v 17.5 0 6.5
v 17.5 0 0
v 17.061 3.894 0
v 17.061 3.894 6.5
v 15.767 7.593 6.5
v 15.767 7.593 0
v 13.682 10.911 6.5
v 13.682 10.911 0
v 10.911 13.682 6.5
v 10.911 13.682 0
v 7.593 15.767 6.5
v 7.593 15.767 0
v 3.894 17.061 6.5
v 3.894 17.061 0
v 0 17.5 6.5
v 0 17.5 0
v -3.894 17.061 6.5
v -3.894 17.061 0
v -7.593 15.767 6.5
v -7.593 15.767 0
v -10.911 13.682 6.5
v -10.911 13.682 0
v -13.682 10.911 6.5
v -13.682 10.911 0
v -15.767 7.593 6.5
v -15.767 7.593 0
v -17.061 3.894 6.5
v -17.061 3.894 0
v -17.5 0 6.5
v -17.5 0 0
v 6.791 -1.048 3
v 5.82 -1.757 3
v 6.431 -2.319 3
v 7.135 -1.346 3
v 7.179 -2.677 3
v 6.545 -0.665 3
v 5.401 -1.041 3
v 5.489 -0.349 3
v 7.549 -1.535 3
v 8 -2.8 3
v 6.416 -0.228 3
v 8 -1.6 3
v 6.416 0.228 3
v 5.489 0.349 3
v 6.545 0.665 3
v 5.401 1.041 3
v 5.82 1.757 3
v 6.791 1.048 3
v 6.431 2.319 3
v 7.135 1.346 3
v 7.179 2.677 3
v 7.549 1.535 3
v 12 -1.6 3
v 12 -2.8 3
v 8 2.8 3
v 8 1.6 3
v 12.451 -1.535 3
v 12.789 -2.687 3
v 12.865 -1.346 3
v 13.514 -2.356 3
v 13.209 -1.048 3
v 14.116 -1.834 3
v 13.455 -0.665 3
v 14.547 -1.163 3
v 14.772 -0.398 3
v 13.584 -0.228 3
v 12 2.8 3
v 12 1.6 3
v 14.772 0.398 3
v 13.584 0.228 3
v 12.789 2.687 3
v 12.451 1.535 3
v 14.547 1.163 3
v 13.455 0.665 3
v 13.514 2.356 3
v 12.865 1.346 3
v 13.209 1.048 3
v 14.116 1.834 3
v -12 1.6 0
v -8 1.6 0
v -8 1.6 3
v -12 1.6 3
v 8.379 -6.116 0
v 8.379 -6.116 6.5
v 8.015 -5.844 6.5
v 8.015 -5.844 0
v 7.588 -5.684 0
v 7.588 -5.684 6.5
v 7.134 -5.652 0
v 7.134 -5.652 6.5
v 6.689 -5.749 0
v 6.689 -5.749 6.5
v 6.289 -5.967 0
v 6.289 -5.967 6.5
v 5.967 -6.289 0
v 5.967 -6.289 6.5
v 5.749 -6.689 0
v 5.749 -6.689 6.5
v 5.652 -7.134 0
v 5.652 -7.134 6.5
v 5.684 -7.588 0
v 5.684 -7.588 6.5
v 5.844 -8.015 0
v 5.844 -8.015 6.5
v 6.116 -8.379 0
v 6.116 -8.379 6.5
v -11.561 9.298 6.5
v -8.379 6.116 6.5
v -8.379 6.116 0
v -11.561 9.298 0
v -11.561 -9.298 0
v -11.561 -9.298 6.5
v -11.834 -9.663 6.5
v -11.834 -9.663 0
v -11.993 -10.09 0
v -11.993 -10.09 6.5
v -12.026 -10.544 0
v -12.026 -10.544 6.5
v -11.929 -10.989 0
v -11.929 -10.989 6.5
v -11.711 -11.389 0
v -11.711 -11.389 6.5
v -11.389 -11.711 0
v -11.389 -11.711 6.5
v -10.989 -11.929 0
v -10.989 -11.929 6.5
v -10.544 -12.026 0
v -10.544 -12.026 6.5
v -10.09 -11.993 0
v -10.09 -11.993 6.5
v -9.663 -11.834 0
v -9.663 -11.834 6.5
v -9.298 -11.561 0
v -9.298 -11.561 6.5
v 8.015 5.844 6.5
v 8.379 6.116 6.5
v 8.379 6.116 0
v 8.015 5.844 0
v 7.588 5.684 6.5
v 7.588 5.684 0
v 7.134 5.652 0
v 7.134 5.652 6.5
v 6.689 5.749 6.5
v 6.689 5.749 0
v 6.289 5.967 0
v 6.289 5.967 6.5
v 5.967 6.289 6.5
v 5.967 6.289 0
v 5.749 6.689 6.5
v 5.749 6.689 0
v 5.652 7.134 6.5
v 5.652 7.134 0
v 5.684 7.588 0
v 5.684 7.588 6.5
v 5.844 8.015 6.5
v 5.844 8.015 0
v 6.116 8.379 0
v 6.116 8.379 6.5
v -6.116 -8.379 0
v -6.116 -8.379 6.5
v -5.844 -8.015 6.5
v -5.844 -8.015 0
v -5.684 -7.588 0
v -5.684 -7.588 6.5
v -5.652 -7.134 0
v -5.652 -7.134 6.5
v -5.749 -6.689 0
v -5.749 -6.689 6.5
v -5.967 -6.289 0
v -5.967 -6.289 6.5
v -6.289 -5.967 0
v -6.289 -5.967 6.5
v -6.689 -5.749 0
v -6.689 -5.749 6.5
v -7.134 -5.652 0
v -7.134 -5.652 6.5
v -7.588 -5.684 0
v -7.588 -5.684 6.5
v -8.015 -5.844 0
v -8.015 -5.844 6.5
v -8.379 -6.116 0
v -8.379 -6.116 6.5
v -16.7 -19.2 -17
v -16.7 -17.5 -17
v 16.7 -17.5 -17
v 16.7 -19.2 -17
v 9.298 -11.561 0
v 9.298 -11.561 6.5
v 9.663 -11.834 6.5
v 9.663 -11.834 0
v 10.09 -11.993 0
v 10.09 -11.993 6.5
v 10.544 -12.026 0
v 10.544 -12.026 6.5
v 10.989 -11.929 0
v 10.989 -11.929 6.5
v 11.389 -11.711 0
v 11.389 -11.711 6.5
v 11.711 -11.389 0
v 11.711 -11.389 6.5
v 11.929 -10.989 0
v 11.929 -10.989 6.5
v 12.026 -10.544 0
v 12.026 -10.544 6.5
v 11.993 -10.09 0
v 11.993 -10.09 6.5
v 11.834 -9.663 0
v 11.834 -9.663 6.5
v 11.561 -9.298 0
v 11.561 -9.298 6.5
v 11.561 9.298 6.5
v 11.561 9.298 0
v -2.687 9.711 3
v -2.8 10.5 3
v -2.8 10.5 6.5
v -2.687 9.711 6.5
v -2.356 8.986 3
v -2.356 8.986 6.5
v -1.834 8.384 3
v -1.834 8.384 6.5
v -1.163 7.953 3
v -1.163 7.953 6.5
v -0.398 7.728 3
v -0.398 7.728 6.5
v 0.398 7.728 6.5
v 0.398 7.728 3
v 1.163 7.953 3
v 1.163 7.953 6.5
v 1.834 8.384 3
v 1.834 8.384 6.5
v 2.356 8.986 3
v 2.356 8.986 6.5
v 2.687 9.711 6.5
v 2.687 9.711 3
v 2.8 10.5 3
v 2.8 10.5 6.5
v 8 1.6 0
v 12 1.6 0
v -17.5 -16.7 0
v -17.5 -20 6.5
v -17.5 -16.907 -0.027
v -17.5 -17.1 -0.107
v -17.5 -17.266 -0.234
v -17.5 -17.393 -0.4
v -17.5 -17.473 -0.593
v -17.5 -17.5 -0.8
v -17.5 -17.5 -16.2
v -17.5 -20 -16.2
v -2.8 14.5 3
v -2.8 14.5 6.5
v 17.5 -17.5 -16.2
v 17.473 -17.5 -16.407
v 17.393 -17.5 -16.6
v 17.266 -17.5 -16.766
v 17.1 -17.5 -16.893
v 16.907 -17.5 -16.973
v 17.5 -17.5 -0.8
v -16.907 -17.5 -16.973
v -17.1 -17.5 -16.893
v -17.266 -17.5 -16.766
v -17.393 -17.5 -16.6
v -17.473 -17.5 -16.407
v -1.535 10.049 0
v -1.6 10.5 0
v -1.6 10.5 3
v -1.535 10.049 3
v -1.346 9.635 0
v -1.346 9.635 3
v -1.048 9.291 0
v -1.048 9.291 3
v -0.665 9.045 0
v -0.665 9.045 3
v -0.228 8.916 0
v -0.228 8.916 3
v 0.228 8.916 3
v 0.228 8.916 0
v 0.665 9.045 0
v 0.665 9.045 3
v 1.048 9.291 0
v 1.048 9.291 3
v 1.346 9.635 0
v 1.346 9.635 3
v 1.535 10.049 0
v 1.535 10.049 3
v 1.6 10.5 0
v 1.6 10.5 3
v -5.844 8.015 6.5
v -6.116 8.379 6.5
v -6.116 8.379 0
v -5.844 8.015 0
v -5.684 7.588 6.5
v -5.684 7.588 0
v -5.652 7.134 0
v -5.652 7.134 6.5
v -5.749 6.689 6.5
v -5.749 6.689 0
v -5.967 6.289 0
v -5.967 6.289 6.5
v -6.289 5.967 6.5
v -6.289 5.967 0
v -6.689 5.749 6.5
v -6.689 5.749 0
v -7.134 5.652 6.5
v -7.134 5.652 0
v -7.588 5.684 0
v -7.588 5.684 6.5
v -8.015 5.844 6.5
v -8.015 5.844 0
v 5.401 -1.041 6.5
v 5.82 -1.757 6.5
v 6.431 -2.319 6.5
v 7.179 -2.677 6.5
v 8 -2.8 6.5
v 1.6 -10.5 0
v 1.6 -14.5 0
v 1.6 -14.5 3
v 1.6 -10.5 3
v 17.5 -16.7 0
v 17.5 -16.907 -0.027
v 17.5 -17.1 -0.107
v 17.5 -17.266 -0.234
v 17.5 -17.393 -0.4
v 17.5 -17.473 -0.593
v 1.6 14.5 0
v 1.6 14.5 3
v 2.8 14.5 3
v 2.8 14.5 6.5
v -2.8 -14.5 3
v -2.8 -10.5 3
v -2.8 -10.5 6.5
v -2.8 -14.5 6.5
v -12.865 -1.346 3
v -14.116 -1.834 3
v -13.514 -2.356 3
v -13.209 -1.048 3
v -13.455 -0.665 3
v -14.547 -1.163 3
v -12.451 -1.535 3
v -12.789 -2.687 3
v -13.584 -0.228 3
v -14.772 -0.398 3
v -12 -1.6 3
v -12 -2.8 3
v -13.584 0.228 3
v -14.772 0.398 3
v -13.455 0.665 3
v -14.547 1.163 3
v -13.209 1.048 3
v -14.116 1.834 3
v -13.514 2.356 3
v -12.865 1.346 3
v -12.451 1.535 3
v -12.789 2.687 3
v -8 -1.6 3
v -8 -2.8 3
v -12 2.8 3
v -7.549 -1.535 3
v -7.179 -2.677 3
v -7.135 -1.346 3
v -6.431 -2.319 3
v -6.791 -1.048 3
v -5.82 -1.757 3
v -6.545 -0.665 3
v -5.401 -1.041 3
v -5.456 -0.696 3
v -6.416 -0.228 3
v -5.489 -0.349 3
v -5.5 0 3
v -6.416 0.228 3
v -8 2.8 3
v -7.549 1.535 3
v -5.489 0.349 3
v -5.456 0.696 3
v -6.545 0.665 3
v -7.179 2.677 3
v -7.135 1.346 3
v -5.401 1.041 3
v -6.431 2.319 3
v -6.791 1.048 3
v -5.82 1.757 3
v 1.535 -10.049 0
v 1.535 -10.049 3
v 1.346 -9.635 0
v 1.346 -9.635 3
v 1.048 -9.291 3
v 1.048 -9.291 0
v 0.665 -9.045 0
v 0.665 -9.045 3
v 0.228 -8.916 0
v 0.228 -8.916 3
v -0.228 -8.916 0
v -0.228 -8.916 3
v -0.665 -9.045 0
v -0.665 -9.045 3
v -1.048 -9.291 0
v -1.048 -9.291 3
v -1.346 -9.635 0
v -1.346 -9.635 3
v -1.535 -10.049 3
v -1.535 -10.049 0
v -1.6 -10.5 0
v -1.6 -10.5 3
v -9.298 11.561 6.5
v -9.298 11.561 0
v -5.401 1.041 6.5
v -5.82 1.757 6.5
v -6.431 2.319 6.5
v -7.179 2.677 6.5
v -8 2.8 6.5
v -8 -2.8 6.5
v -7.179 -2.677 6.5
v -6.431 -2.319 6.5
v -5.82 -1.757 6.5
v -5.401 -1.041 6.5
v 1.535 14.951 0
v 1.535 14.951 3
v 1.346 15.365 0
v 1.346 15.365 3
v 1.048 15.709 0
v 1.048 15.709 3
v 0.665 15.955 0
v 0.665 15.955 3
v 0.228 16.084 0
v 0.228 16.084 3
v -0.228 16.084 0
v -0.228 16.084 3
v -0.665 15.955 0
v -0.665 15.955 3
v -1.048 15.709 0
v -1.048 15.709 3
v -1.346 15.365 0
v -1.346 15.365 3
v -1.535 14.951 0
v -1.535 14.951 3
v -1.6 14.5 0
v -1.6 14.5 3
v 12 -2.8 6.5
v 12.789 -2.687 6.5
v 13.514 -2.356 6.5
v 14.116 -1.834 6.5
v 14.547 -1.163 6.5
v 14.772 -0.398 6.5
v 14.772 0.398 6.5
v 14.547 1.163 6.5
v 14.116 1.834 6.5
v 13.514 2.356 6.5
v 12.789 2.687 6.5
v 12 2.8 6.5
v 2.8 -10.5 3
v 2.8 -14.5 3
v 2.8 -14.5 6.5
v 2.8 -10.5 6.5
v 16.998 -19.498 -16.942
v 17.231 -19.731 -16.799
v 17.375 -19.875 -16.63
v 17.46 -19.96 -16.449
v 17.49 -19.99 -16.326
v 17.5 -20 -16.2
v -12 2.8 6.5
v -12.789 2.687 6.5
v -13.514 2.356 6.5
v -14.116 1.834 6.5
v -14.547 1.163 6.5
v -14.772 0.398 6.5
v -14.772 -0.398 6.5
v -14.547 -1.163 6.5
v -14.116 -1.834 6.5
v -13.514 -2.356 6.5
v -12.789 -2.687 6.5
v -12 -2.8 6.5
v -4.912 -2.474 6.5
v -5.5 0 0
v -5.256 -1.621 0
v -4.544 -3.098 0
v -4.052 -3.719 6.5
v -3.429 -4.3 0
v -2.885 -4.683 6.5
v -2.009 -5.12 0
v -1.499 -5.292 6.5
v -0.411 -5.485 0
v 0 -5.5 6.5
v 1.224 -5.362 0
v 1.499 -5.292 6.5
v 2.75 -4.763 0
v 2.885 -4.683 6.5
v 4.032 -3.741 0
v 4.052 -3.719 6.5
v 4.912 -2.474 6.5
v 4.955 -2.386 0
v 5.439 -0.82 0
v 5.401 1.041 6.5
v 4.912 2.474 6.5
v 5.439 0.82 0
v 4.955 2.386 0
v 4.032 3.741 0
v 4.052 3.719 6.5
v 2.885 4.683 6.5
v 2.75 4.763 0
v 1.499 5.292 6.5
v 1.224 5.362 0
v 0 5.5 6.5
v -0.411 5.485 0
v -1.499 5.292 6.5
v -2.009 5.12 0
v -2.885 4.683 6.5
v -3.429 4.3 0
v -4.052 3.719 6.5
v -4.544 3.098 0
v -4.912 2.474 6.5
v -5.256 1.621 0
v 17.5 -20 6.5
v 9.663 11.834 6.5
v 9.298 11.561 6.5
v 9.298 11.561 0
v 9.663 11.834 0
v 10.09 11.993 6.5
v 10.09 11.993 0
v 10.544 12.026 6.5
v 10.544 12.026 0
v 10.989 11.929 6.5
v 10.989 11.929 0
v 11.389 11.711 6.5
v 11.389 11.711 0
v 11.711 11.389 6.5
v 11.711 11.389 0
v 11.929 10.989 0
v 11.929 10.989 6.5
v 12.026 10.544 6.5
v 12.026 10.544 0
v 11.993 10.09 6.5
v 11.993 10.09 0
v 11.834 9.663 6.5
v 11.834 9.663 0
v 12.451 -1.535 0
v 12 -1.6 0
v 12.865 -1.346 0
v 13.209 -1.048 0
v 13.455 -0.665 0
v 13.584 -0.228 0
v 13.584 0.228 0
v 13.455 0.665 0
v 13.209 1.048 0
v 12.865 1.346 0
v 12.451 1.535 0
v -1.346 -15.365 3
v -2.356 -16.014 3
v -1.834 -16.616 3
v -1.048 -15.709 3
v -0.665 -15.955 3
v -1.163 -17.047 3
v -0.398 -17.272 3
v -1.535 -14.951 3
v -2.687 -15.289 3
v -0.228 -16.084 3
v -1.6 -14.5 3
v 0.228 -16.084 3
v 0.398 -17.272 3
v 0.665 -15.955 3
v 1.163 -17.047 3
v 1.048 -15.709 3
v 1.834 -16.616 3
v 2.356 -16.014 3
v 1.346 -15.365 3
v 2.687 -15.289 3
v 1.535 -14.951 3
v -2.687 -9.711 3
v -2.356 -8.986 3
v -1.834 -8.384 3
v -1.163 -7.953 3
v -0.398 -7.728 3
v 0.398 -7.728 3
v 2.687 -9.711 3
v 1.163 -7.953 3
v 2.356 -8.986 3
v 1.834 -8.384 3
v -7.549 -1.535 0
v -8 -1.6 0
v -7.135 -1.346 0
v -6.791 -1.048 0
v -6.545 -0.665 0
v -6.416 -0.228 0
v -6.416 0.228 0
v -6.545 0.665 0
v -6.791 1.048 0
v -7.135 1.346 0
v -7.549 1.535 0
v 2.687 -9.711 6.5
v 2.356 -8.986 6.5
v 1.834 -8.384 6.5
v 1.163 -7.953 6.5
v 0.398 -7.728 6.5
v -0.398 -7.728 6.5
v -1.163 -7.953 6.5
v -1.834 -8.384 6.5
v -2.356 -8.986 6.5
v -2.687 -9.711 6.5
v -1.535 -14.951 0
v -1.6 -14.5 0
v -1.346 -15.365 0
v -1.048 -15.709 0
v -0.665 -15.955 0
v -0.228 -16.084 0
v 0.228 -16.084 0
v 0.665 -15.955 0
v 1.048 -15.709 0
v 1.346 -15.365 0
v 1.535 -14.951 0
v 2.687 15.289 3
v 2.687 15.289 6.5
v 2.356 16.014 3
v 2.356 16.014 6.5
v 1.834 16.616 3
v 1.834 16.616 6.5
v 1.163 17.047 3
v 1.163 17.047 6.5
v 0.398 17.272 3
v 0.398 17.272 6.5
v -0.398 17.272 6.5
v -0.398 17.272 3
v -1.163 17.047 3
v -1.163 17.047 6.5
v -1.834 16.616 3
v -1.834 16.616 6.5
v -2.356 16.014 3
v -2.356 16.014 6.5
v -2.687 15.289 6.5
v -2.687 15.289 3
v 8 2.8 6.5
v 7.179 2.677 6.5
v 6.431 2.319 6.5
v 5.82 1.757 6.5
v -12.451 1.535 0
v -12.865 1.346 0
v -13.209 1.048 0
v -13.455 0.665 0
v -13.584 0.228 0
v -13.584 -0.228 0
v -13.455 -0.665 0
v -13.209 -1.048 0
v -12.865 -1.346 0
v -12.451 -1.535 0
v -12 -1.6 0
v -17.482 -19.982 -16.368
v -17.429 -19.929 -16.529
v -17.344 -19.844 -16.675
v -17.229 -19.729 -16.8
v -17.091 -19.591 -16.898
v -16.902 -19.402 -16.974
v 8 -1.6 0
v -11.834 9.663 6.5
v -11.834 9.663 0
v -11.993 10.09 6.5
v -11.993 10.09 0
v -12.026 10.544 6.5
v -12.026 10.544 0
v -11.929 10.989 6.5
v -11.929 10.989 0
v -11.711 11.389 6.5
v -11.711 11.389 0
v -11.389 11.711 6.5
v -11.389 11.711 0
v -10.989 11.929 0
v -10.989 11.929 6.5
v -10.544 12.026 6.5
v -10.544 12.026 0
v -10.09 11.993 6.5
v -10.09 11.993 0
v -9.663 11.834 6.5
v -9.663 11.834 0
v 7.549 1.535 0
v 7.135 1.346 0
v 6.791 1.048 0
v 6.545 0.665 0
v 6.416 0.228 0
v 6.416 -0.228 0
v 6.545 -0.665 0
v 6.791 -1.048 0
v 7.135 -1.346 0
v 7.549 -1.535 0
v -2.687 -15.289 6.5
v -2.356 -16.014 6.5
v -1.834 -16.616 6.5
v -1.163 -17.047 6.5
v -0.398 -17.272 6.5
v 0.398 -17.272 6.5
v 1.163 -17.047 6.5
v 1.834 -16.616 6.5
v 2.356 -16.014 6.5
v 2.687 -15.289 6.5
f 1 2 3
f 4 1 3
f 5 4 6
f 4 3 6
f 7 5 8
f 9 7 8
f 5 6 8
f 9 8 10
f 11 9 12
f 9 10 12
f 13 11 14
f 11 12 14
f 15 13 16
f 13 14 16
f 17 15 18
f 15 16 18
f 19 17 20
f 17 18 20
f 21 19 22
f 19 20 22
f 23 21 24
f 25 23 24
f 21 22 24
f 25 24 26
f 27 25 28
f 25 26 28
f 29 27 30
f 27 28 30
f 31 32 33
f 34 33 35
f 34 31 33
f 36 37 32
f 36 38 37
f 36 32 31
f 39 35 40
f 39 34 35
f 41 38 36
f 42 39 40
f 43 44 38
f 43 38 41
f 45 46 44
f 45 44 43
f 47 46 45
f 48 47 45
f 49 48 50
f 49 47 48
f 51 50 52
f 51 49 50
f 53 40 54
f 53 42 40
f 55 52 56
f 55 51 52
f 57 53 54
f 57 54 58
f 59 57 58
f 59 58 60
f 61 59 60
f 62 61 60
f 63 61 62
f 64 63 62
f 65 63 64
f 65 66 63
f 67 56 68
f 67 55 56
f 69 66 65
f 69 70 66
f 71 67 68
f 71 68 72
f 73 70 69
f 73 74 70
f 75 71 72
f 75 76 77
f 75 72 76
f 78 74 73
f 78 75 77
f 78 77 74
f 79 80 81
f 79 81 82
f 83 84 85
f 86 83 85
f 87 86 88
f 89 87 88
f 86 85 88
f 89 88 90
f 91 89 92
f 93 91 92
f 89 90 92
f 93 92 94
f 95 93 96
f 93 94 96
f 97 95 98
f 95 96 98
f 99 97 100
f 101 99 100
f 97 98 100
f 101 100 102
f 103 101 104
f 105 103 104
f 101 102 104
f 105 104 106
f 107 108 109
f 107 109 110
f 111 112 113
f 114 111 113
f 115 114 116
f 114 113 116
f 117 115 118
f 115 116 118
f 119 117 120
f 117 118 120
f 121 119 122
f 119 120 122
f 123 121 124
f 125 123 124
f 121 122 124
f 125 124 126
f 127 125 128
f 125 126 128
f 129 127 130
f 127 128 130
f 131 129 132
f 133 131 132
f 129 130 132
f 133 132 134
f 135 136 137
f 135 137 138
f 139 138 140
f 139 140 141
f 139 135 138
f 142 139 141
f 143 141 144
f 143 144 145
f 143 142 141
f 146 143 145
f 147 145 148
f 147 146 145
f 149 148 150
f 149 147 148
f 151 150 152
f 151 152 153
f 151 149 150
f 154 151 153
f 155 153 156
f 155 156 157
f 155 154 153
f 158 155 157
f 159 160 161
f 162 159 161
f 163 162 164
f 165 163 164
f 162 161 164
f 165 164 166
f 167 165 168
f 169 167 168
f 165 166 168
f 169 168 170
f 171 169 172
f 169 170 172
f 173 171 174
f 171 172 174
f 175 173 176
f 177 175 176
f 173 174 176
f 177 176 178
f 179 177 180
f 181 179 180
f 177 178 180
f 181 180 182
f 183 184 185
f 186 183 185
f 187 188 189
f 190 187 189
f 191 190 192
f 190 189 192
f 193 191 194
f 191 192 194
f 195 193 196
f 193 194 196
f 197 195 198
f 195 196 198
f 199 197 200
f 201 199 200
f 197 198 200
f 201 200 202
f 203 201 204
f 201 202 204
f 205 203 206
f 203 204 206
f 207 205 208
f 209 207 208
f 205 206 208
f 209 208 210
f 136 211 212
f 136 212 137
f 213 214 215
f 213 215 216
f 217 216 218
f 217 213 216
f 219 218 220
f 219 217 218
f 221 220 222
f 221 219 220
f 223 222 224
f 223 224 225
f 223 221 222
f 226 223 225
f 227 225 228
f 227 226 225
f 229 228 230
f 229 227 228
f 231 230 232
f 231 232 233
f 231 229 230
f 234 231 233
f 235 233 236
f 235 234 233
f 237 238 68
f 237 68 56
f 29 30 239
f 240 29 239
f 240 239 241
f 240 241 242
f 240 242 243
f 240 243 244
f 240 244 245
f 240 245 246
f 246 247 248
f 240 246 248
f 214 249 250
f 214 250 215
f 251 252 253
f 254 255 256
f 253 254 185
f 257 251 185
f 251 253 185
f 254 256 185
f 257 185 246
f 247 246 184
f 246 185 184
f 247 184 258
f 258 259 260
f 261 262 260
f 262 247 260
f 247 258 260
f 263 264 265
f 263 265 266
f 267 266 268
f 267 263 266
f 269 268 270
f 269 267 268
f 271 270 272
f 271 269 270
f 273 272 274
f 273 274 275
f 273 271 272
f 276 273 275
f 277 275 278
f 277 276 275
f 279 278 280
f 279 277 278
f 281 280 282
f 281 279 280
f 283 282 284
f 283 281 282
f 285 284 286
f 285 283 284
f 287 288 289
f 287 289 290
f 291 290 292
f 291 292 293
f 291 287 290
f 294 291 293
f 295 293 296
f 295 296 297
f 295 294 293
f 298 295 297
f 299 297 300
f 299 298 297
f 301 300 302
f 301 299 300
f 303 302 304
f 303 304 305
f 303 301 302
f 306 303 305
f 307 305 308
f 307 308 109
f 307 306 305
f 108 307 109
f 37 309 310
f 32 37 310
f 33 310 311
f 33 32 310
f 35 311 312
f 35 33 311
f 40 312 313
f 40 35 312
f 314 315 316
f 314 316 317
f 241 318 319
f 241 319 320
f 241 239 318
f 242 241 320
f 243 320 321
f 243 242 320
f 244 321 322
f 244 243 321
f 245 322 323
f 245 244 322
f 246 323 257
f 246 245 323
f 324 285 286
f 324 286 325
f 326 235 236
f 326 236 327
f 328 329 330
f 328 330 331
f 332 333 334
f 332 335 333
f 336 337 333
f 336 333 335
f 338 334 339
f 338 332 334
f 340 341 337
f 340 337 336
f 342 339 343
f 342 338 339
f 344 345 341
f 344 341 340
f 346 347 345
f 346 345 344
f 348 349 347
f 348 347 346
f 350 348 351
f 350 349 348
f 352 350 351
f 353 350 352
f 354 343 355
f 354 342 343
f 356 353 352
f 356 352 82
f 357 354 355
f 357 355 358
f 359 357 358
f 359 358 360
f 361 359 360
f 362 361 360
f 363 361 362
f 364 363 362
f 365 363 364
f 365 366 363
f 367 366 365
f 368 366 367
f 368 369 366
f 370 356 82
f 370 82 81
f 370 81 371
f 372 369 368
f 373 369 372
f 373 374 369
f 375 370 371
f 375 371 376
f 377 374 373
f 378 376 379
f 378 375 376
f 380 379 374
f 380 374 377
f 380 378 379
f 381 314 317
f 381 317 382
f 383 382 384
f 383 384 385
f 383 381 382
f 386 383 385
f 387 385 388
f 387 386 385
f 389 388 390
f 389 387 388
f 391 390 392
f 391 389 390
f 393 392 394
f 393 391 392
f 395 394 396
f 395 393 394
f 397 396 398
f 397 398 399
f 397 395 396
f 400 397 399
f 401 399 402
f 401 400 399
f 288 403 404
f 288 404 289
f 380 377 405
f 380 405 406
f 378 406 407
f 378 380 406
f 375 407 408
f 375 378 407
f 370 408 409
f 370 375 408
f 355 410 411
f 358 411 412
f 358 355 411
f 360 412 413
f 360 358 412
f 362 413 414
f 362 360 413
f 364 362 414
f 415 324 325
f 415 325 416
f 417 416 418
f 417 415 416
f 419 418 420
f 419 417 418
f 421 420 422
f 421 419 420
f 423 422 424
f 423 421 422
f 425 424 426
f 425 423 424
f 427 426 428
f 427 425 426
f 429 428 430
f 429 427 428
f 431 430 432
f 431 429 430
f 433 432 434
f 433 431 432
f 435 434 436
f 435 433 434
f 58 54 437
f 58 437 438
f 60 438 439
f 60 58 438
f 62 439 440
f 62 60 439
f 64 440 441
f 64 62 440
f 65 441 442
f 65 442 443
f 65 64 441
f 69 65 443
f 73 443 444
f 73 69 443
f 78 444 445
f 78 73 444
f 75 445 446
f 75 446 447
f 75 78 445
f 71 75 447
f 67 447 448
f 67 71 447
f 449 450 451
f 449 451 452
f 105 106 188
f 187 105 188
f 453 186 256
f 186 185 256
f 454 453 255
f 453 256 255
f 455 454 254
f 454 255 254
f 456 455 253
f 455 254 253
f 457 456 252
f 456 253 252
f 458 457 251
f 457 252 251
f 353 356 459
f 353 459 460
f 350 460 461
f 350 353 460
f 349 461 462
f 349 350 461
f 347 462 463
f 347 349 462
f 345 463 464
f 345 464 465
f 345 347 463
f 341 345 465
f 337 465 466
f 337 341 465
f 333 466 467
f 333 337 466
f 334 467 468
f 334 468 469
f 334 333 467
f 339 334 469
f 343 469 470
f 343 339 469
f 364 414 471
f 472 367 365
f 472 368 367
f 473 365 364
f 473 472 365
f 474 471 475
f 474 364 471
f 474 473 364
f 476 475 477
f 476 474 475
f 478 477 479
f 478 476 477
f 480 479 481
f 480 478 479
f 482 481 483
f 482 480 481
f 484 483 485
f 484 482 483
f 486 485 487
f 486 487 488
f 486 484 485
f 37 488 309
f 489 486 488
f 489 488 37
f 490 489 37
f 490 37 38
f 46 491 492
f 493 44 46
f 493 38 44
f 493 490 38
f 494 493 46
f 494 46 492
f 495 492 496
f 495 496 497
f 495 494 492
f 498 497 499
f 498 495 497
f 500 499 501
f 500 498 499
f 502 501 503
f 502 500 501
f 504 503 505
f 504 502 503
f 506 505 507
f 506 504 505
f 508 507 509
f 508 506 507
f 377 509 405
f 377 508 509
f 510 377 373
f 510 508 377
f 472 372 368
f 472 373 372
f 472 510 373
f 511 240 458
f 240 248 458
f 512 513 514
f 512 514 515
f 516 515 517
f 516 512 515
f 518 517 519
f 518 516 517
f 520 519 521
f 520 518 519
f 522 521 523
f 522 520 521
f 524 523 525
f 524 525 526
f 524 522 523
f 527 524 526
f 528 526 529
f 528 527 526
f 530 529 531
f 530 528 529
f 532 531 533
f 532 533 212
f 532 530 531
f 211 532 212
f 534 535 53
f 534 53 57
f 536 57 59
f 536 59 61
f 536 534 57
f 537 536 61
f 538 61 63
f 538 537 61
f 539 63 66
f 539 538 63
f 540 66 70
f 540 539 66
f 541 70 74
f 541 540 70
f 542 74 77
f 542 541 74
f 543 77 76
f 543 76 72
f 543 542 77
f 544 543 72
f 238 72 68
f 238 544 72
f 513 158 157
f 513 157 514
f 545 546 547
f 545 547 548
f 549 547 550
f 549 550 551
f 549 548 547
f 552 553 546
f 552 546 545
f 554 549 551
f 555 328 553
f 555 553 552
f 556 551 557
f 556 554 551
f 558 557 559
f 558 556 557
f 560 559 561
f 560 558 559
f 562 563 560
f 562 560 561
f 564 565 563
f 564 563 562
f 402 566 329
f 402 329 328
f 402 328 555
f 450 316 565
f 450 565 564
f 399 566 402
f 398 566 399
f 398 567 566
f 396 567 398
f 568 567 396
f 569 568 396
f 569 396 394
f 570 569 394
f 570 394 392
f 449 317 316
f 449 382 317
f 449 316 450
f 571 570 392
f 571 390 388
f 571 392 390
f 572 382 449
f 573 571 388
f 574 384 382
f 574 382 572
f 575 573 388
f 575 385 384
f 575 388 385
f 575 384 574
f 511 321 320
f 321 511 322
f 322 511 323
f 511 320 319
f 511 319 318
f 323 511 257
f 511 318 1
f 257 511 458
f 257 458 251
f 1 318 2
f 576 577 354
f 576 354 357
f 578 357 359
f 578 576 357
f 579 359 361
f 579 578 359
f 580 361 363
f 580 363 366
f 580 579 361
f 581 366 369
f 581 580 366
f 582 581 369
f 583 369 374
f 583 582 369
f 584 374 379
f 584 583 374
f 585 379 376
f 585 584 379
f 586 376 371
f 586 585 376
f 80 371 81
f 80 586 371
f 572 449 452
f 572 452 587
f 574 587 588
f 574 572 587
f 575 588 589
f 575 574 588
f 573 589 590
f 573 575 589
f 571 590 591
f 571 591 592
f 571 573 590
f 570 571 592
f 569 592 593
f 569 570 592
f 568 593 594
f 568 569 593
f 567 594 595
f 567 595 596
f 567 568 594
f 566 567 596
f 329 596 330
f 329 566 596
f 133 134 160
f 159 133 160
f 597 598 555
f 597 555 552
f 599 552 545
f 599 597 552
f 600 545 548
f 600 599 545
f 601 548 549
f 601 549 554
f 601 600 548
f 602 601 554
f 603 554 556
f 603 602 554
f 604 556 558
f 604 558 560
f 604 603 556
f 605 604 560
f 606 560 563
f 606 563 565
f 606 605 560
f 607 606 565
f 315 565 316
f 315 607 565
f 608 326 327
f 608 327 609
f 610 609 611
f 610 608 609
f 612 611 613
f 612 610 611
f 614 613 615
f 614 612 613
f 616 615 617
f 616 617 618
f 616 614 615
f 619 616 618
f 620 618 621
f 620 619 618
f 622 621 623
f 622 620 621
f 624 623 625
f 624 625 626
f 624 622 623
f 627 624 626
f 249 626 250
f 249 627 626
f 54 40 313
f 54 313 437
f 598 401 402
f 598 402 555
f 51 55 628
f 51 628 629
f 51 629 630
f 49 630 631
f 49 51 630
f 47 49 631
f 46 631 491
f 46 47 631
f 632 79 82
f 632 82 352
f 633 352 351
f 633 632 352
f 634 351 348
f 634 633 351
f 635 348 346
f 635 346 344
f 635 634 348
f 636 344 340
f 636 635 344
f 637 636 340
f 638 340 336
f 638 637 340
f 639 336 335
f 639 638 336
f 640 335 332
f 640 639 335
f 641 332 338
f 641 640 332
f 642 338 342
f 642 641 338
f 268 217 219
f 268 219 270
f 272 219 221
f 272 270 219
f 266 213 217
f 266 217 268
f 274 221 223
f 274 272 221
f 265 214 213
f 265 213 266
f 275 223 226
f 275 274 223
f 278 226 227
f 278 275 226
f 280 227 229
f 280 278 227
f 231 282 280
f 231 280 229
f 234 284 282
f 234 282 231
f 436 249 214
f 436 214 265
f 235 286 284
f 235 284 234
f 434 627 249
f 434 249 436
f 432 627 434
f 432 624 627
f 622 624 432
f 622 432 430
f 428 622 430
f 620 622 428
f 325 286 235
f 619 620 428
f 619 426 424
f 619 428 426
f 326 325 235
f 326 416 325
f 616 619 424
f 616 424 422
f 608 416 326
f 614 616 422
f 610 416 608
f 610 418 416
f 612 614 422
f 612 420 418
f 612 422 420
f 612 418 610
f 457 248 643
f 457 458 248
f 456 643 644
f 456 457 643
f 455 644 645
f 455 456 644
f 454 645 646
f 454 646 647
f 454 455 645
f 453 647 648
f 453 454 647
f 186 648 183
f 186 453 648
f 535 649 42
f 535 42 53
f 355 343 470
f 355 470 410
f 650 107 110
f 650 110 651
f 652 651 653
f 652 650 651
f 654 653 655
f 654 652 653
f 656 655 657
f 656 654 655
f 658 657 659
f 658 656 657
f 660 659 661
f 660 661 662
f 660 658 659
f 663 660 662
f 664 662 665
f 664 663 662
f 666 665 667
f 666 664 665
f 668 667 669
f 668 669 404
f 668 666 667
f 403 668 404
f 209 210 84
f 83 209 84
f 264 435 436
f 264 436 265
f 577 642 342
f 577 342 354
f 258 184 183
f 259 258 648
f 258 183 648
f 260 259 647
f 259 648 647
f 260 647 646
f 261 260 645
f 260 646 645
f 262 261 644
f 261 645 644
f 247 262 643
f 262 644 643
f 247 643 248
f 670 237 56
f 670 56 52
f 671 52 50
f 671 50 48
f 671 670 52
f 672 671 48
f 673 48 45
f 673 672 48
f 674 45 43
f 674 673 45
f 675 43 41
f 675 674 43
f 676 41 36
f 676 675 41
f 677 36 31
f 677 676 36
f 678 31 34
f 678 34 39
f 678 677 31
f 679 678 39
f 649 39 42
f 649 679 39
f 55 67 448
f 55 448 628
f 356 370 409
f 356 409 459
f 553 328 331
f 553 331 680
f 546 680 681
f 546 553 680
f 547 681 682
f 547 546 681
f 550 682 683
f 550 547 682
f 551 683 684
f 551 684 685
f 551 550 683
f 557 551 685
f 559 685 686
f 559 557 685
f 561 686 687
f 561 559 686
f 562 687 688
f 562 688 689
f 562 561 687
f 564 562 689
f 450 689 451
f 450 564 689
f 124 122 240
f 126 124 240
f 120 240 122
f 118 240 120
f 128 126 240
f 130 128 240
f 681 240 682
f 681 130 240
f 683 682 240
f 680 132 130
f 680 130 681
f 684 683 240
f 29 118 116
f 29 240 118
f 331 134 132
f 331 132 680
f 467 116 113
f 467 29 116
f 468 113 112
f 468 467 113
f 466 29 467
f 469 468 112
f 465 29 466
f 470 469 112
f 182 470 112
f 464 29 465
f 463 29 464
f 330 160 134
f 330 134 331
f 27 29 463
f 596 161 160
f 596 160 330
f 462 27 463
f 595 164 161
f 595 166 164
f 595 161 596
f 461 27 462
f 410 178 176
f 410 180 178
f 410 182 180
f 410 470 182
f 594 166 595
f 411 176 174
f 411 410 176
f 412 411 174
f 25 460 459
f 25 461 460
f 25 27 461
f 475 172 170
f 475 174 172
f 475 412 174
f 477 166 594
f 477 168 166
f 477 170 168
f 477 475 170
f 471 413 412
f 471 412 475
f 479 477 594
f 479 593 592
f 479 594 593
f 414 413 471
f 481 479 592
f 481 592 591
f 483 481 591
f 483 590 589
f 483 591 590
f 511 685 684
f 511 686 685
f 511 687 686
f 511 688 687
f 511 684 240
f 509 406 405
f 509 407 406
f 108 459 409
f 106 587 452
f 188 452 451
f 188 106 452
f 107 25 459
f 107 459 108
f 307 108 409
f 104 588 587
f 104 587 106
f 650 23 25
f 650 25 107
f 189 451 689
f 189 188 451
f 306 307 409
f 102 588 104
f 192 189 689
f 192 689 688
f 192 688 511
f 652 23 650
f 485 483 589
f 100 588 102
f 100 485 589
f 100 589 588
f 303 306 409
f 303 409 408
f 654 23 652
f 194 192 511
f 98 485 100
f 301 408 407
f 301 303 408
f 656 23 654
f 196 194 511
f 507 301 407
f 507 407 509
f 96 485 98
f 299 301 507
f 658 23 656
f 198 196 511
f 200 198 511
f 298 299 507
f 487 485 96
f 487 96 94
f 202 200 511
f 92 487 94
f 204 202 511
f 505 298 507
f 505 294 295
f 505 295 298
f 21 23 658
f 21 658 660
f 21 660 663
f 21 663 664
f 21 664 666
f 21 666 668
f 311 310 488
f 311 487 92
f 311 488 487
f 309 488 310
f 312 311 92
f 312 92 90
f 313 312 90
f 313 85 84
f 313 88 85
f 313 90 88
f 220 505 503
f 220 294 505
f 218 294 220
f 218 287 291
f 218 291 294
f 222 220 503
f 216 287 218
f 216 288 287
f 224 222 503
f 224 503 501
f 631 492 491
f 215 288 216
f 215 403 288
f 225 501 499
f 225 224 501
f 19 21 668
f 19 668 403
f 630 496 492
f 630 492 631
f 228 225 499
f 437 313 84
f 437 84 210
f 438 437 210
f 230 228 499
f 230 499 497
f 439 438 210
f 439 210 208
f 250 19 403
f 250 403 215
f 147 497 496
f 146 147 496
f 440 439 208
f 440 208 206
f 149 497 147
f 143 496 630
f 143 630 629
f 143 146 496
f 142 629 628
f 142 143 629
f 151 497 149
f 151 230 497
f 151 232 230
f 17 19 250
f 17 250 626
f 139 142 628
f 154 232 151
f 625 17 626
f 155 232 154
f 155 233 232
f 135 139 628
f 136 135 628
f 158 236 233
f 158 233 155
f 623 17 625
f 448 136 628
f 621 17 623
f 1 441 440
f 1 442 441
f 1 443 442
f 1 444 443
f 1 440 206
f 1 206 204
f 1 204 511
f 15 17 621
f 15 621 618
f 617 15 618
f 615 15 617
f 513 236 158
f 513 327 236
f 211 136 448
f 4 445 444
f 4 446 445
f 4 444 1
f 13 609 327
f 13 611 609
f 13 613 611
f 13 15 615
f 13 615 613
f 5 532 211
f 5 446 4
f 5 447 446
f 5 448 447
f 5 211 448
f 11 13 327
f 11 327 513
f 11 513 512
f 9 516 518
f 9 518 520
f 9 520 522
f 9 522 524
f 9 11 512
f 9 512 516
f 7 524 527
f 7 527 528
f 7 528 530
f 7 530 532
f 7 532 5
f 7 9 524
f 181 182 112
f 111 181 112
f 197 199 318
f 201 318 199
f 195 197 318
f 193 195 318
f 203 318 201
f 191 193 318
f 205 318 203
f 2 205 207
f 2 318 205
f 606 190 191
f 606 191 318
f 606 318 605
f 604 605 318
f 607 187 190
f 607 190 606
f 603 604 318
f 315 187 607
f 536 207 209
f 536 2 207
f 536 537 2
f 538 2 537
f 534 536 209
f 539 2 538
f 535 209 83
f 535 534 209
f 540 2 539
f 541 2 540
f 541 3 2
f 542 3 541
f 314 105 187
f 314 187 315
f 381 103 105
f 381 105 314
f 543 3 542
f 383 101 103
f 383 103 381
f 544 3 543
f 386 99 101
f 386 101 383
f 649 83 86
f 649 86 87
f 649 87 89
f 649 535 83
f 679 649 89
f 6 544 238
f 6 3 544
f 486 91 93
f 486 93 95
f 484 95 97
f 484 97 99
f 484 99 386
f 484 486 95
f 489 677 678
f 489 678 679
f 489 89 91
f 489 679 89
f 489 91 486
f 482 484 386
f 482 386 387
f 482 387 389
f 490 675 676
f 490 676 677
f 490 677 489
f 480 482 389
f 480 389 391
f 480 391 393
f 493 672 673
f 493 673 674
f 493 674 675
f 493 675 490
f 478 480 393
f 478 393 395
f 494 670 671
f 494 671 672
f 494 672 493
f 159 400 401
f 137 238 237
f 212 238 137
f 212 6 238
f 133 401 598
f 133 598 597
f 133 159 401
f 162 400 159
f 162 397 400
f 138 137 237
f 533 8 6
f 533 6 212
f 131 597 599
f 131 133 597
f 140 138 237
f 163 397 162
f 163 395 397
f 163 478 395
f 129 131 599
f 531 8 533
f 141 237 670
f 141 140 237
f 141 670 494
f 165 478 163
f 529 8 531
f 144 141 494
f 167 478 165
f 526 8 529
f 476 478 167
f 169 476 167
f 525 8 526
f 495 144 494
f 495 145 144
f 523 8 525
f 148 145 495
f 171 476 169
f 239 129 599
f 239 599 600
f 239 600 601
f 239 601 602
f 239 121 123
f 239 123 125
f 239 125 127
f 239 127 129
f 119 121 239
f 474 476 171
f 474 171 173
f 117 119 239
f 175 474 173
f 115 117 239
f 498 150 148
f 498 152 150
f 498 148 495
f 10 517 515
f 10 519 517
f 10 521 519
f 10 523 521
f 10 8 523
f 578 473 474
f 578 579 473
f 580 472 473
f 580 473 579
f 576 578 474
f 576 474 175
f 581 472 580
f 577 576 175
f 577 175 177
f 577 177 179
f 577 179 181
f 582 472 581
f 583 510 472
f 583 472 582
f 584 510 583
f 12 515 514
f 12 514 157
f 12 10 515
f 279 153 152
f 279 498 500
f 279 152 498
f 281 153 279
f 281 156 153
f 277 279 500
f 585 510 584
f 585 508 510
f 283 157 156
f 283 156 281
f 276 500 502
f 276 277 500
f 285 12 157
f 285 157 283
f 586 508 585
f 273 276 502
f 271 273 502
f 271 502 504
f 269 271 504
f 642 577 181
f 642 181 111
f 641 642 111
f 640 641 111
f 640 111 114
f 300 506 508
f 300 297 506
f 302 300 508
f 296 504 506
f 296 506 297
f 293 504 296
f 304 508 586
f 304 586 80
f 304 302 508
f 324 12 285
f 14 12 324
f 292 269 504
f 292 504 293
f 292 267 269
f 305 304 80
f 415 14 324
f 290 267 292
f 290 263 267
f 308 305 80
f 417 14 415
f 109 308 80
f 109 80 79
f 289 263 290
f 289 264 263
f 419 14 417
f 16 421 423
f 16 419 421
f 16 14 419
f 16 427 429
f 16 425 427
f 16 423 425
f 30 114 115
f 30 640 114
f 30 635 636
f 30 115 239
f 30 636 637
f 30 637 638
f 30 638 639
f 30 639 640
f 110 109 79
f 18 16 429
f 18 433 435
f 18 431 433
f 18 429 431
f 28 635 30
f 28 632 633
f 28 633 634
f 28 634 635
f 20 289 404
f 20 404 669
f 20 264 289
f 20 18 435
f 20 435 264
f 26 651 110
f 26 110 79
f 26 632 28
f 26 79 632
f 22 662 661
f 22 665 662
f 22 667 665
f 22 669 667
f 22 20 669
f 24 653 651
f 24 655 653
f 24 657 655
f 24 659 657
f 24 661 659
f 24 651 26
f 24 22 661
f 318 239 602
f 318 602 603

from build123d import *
from build123d.topology import SkipClean

# Parameters (mm, degrees)
SKETCH_1_R          = 17.5
EXTRUDE_1_DEPTH     = 3
EXTRUDE_START       = -20
EXTRUDE_2_DEPTH     = 20
SKETCH_3_W          = 42.038336367
SKETCH_3_H          = 17.5
CUT_EXTRUDE_2_DEPTH = 17
FILLET_1_R          = 0.8
SKETCH_4_R          = 5.5
CUT_EXTRUDE_3_DEPTH = 32.547583109
SKETCH_5_R          = 5.5
EXTRUDE_3_DEPTH     = 3.5
CUT_EXTRUDE_START   = -3.5
CUT_EXTRUDE_5_DEPTH = 3.5
CUT_EXTRUDE_6_DEPTH = 6.5


with BuildPart() as part:
    # 草图1 → 凸台-拉伸1 (new body)
    with BuildSketch(Plane.XY):
        Circle(SKETCH_1_R)
        with BuildLine():
            Line((1.6, 14.5), (1.6, 10.5))
            ThreePointArc((1.6, 10.5), (0, 8.9), (-1.6, 10.5))
            Line((-1.6, 10.5), (-1.6, 14.5))
            ThreePointArc((-1.6, 14.5), (0, 16.1), (1.6, 14.5))
        make_face(mode=Mode.SUBTRACT)
        with BuildLine():
            Line((1.6, -14.5), (1.6, -10.5))
            ThreePointArc((1.6, -10.5), (0, -8.9), (-1.6, -10.5))
            Line((-1.6, -10.5), (-1.6, -14.5))
            ThreePointArc((-1.6, -14.5), (0, -16.1), (1.6, -14.5))
        make_face(mode=Mode.SUBTRACT)
        with BuildLine():
            Line((-12, 1.6), (-8, 1.6))
            ThreePointArc((-8, 1.6), (-6.4, 0), (-8, -1.6))
            Line((-8, -1.6), (-12, -1.6))
            ThreePointArc((-12, -1.6), (-13.6, 0), (-12, 1.6))
        make_face(mode=Mode.SUBTRACT)
        with BuildLine():
            Line((12, 1.6), (8, 1.6))
            ThreePointArc((8, 1.6), (6.4, 0), (8, -1.6))
            Line((8, -1.6), (12, -1.6))
            ThreePointArc((12, -1.6), (13.6, 0), (12, 1.6))
        make_face(mode=Mode.SUBTRACT)
    extrude(amount=EXTRUDE_1_DEPTH)

    # 草图2 → 凸台-拉伸2 (add)
    with BuildSketch(Plane.XY.offset(3).offset(EXTRUDE_START)):
        with BuildLine():
            Line((-17.5, -20), (17.5, -20))
            Line((17.5, -20), (17.5, 0))
            ThreePointArc((17.5, 0), (0, -17.5), (-17.5, 0))
            Line((-17.5, 0), (-17.5, -20))
        make_face()
    extrude(amount=EXTRUDE_2_DEPTH)

    # 草图3 → 切除-拉伸2 (cut)
    with BuildSketch(Plane(origin=(0, 0, -17), x_dir=(-1, 0, 0), z_dir=(0, 0, -1))):
        with Locations((-0.801424091, -8.75)):
            Rectangle(SKETCH_3_W, SKETCH_3_H)
    extrude(amount=-CUT_EXTRUDE_2_DEPTH, mode=Mode.SUBTRACT)

    # 圆角1
    fillet_1_edges = [part.edges().sort_by_distance(p)[0] for p in [
        (17.5, -18.75, -17),
        (0, -20, -17),
        (-17.5, -18.75, -17),
        (0, -17.5, 0),
    ]]
    fillet(fillet_1_edges, radius=FILLET_1_R)

    # 草图4 → 切除-拉伸3 (cut, through all)
    with BuildSketch(Plane(origin=(0, 0, 0), x_dir=(-1, 0, 0), z_dir=(0, 0, -1))):
        Circle(SKETCH_4_R)
    extrude(amount=-CUT_EXTRUDE_3_DEPTH, mode=Mode.SUBTRACT)

    # 草图5 → 凸台-拉伸3 (add)
    with SkipClean():  # the faces are left unmerged after this step: merging them gives an invalid solid
        with BuildSketch(Plane.XY.offset(3)):
            with BuildLine():
                Line((-17.5, 0), (-17.5, -20))
                Line((-17.5, -20), (17.5, -20))
                Line((17.5, -20), (17.5, 0))
                ThreePointArc((17.5, 0), (0, 17.5), (-17.5, 0))
            make_face()
            with Locations(Location((0, 0, 0), (0, 0, 180))):
                Circle(SKETCH_5_R, mode=Mode.SUBTRACT)
            with BuildLine():
                Line((1.6, -14.5), (1.6, -10.5))
                ThreePointArc((1.6, -10.5), (0, -8.9), (-1.6, -10.5))
                Line((-1.6, -10.5), (-1.6, -14.5))
                ThreePointArc((-1.6, -14.5), (0, -16.1), (1.6, -14.5))
            make_face(mode=Mode.SUBTRACT)
            with BuildLine():
                Line((-8, 1.6), (-12, 1.6))
                ThreePointArc((-12, 1.6), (-13.6, 0), (-12, -1.6))
                Line((-12, -1.6), (-8, -1.6))
                ThreePointArc((-8, -1.6), (-6.4, 0), (-8, 1.6))
            make_face(mode=Mode.SUBTRACT)
            with BuildLine():
                Line((8, -1.6), (12, -1.6))
                ThreePointArc((12, -1.6), (13.6, 0), (12, 1.6))
                Line((12, 1.6), (8, 1.6))
                ThreePointArc((8, 1.6), (6.4, 0), (8, -1.6))
            make_face(mode=Mode.SUBTRACT)
            with BuildLine():
                Line((1.6, 10.5), (1.6, 14.5))
                ThreePointArc((1.6, 14.5), (0, 16.1), (-1.6, 14.5))
                Line((-1.6, 14.5), (-1.6, 10.5))
                ThreePointArc((-1.6, 10.5), (0, 8.9), (1.6, 10.5))
            make_face(mode=Mode.SUBTRACT)
        extrude(amount=EXTRUDE_3_DEPTH)
    add(part.part.scale(1), mode=Mode.REPLACE)  # the faces are merged on a copy

    # 草图7 → 切除-拉伸5 (cut)
    # profile 1 of 4: a face of its own
    with BuildSketch(Plane.XY.offset(6.5).offset(CUT_EXTRUDE_START)):
        with BuildLine():
            Line((2.8, -14.5), (2.8, -10.5))
            ThreePointArc((2.8, -10.5), (0, -7.7), (-2.8, -10.5))
            Line((-2.8, -10.5), (-2.8, -14.5))
            ThreePointArc((-2.8, -14.5), (0, -17.3), (2.8, -14.5))
        make_face()
        with BuildLine():
            Line((1.6, -14.5), (1.6, -10.5))
            ThreePointArc((1.6, -10.5), (0, -8.9), (-1.6, -10.5))
            Line((-1.6, -10.5), (-1.6, -14.5))
            ThreePointArc((-1.6, -14.5), (0, -16.1), (1.6, -14.5))
        make_face(mode=Mode.SUBTRACT)
    # profile 2 of 4: a face of its own
    with BuildSketch(Plane.XY.offset(6.5).offset(CUT_EXTRUDE_START)):
        with BuildLine():
            Line((8, -2.8), (12, -2.8))
            ThreePointArc((12, -2.8), (14.8, 0), (12, 2.8))
            Line((12, 2.8), (8, 2.8))
            ThreePointArc((8, 2.8), (5.2, 0), (8, -2.8))
        make_face()
        with BuildLine():
            Line((8, -1.6), (12, -1.6))
            ThreePointArc((12, -1.6), (13.6, 0), (12, 1.6))
            Line((12, 1.6), (8, 1.6))
            ThreePointArc((8, 1.6), (6.4, 0), (8, -1.6))
        make_face(mode=Mode.SUBTRACT)
    # profile 3 of 4: a face of its own
    with BuildSketch(Plane.XY.offset(6.5).offset(CUT_EXTRUDE_START)):
        with BuildLine():
            Line((-12, -2.8), (-8, -2.8))
            ThreePointArc((-8, -2.8), (-5.2, 0), (-8, 2.8))
            Line((-8, 2.8), (-12, 2.8))
            ThreePointArc((-12, 2.8), (-14.8, 0), (-12, -2.8))
        make_face()
        with BuildLine():
            Line((-12, -1.6), (-8, -1.6))
            ThreePointArc((-8, -1.6), (-6.4, 0), (-8, 1.6))
            Line((-8, 1.6), (-12, 1.6))
            ThreePointArc((-12, 1.6), (-13.6, 0), (-12, -1.6))
        make_face(mode=Mode.SUBTRACT)
    # profile 4 of 4: a face of its own
    with BuildSketch(Plane.XY.offset(6.5).offset(CUT_EXTRUDE_START)):
        with BuildLine():
            Line((2.8, 10.5), (2.8, 14.5))
            ThreePointArc((2.8, 14.5), (0, 17.3), (-2.8, 14.5))
            Line((-2.8, 14.5), (-2.8, 10.5))
            ThreePointArc((-2.8, 10.5), (0, 7.7), (2.8, 10.5))
        make_face()
        with BuildLine():
            Line((1.6, 10.5), (1.6, 14.5))
            ThreePointArc((1.6, 14.5), (0, 16.1), (-1.6, 14.5))
            Line((-1.6, 14.5), (-1.6, 10.5))
            ThreePointArc((-1.6, 10.5), (0, 8.9), (1.6, 10.5))
        make_face(mode=Mode.SUBTRACT)
    extrude(amount=CUT_EXTRUDE_5_DEPTH, mode=Mode.SUBTRACT)

    # 草图8 → 切除-拉伸6 (cut)
    with BuildSketch(Plane.XY.offset(6.5)):
        with BuildLine():
            Line((11.561195872, 9.298454173), (8.379215357, 6.116473657))
            ThreePointArc((8.379215357, 6.116473657), (6.116473657, 6.116473657), (6.116473657, 8.379215357))
            Line((6.116473657, 8.379215357), (9.298454173, 11.561195872))
            ThreePointArc((9.298454173, 11.561195872), (11.561195872, 11.561195872), (11.561195872, 9.298454173))
        make_face()
        with BuildLine():
            Line((-8.379215357, 6.116473657), (-11.561195872, 9.298454173))
            ThreePointArc((-11.561195872, 9.298454173), (-11.561195872, 11.561195872), (-9.298454173, 11.561195872))
            Line((-9.298454173, 11.561195872), (-6.116473657, 8.379215357))
            ThreePointArc((-6.116473657, 8.379215357), (-6.116473657, 6.116473657), (-8.379215357, 6.116473657))
        make_face()
        with BuildLine():
            Line((6.116473657, -8.379215357), (9.298454173, -11.561195872))
            ThreePointArc((9.298454173, -11.561195872), (11.561195872, -11.561195872), (11.561195872, -9.298454173))
            Line((11.561195872, -9.298454173), (8.379215357, -6.116473657))
            ThreePointArc((8.379215357, -6.116473657), (6.116473657, -6.116473657), (6.116473657, -8.379215357))
        make_face()
        with BuildLine():
            Line((-9.298454173, -11.561195872), (-6.116473657, -8.379215357))
            ThreePointArc((-6.116473657, -8.379215357), (-6.116473657, -6.116473657), (-8.379215357, -6.116473657))
            Line((-8.379215357, -6.116473657), (-11.561195872, -9.298454173))
            ThreePointArc((-11.561195872, -9.298454173), (-11.561195872, -11.561195872), (-9.298454173, -11.561195872))
        make_face()
    extrude(amount=-CUT_EXTRUDE_6_DEPTH, mode=Mode.SUBTRACT)


solid = part.part
